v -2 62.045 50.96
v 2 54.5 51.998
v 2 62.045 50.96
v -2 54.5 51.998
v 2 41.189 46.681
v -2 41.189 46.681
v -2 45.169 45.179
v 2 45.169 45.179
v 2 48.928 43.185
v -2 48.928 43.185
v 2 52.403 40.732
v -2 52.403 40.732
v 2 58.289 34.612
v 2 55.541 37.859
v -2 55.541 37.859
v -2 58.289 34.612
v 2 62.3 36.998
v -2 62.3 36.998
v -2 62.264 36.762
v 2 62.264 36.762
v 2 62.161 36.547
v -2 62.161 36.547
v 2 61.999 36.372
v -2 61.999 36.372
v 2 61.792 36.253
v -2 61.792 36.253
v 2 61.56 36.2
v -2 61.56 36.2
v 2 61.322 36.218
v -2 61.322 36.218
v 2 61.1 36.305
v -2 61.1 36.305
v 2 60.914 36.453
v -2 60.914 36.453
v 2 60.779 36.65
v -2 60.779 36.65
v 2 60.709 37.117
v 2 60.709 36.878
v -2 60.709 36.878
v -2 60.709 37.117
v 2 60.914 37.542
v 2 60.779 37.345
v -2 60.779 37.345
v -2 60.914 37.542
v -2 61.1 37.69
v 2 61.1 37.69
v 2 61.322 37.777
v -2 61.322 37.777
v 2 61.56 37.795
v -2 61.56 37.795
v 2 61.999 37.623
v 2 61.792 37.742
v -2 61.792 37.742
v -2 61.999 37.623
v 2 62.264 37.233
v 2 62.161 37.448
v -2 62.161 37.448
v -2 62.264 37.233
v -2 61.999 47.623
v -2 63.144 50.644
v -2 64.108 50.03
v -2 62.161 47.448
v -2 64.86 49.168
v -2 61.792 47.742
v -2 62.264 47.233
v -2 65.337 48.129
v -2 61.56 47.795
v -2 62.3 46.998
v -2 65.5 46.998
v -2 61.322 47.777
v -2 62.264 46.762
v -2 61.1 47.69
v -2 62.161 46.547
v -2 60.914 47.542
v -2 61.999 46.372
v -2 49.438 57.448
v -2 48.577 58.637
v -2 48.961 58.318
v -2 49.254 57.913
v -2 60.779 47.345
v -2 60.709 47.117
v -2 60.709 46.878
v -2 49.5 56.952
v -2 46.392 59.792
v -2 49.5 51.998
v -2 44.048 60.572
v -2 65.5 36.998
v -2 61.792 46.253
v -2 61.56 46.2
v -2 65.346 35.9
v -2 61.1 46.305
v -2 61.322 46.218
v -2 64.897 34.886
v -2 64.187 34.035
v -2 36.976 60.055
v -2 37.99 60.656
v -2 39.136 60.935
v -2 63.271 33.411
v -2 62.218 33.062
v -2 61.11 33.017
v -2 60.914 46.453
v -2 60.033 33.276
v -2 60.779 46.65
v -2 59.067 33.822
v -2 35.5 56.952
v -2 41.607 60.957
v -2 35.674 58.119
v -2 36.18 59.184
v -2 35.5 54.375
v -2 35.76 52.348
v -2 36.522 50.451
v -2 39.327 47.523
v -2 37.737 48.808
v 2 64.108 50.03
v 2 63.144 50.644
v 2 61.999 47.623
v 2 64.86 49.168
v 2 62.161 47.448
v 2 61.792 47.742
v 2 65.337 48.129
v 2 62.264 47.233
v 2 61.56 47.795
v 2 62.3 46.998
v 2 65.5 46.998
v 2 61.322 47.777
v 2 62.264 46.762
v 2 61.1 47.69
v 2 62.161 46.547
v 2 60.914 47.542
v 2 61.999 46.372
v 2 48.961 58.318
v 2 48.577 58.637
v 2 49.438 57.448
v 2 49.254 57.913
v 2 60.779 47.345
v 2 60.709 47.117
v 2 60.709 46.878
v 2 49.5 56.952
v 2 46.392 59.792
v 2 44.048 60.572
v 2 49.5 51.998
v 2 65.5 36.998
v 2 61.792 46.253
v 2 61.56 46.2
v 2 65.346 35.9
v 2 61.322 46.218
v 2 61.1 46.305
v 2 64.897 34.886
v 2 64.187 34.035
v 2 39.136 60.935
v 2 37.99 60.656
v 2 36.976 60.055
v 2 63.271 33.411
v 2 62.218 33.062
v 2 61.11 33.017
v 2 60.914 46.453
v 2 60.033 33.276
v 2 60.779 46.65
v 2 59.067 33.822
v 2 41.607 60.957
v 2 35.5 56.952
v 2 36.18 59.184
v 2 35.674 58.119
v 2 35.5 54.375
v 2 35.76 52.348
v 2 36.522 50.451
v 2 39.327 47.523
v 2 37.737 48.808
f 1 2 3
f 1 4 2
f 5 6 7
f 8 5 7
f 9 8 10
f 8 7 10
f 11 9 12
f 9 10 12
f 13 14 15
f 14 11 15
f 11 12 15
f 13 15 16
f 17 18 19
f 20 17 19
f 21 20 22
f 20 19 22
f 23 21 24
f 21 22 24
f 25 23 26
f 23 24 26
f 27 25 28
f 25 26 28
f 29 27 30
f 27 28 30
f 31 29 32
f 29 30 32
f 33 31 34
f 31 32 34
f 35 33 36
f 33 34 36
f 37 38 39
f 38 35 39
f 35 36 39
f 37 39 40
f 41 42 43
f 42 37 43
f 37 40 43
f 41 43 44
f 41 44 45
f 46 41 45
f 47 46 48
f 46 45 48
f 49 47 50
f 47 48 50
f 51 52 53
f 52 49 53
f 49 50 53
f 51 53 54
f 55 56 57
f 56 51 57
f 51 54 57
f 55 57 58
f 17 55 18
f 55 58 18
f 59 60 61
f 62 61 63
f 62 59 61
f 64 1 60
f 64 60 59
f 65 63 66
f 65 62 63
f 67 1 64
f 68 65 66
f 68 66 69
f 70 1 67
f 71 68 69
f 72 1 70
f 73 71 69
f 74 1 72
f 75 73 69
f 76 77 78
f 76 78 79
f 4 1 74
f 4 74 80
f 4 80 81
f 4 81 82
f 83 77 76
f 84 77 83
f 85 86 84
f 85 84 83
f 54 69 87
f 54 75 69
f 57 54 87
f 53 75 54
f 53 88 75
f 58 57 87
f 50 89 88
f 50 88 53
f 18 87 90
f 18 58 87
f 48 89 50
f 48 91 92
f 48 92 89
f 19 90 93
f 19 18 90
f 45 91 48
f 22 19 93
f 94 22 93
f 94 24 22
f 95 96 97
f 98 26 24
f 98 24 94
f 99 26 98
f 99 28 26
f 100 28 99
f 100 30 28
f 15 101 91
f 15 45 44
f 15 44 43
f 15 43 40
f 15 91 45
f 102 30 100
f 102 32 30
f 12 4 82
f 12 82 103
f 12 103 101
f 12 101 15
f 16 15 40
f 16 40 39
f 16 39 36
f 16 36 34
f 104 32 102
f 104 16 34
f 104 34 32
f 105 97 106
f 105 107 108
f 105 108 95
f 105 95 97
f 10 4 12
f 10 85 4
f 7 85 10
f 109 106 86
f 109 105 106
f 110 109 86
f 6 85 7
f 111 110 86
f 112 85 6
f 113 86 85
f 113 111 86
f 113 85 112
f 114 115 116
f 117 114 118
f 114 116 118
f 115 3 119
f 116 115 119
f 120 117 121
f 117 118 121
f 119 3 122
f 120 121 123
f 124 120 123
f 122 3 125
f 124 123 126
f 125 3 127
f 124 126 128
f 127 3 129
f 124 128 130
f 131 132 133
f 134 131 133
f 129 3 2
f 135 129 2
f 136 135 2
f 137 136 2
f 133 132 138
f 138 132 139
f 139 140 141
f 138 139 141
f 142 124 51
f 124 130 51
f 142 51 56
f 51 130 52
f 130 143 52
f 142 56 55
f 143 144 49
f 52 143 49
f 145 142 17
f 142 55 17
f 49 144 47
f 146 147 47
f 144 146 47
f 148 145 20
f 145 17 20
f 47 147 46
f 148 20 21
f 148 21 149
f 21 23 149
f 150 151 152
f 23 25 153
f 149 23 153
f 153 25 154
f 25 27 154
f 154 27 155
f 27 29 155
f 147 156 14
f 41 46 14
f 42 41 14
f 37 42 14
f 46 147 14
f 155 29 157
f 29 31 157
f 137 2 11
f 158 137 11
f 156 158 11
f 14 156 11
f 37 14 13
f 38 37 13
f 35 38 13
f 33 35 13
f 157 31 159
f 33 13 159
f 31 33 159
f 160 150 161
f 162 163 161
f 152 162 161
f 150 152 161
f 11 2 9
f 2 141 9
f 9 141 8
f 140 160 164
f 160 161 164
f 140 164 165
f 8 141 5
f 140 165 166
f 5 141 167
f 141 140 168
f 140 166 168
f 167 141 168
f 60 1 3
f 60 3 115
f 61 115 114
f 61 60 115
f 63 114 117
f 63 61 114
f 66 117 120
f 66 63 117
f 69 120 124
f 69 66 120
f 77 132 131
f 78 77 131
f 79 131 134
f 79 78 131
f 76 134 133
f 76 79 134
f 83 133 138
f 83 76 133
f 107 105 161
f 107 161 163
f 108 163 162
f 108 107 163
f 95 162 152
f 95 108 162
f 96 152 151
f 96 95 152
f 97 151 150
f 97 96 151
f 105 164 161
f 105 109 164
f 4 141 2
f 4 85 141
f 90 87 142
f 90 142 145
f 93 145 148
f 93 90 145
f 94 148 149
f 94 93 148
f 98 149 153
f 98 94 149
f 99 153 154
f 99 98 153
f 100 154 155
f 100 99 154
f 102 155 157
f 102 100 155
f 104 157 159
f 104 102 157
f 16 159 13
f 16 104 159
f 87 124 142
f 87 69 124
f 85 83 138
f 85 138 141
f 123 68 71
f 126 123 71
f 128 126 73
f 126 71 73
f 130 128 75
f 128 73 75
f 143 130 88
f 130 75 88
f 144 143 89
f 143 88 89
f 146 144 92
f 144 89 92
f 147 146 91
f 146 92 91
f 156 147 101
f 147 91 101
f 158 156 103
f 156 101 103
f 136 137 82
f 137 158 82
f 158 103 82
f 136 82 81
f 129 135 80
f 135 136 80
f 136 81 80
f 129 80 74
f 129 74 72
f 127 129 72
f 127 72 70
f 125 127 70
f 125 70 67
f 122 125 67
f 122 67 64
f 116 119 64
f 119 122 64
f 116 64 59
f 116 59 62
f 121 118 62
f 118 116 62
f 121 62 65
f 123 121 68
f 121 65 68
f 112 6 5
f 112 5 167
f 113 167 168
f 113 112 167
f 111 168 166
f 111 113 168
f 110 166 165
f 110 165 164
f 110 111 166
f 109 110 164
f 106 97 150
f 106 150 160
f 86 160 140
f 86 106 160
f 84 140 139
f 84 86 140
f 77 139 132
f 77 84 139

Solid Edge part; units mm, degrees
sketch "Sketch1" plane through (0, 0, 0) normal (1, 0, 0) x (0, 1, 0)
  arc A0 (58.2893, 34.6118) -> (41.1893, 46.6809) centre (31.3554, 14.5992) ccw
  arc A1 (41.1893, 46.6809) -> (35.5, 54.3753) centre (43.5478, 54.3753) cw
  line L0 (35.5, 54.3753) -> (35.5, 56.9519)
  arc A2 (35.5, 56.9519) -> (39.1364, 60.9354) centre (39.5, 56.9519) cw
  arc A3 (39.1364, 60.9354) -> (48.5769, 58.6372) centre (40.5, 45.9975) cw
  arc A4 (48.5769, 58.6372) -> (49.5, 56.9519) centre (47.5, 56.9519) cw
  line L1 (49.5, 56.9519) -> (49.5, 51.9975)
  line L2 (49.5, 51.9975) -> (54.5, 51.9975)
  line L3 (54.5, 51.9975) -> (62.0448, 50.9602)
  arc A5 (62.0448, 50.9602) -> (65.5, 46.9975) centre (61.5, 46.9975) cw
  line L4 (65.5, 46.9975) -> (65.5, 36.9975)
  arc A6 (65.5, 36.9975) -> (58.2893, 34.6118) centre (61.5, 36.9975) cw
  circle A7 centre (61.5, 46.9975) radius 0.8
  circle A8 centre (61.5, 36.9975) radius 0.8
extrude "Protrusion1" add sketch "Sketch1" along normal mid plane 4
